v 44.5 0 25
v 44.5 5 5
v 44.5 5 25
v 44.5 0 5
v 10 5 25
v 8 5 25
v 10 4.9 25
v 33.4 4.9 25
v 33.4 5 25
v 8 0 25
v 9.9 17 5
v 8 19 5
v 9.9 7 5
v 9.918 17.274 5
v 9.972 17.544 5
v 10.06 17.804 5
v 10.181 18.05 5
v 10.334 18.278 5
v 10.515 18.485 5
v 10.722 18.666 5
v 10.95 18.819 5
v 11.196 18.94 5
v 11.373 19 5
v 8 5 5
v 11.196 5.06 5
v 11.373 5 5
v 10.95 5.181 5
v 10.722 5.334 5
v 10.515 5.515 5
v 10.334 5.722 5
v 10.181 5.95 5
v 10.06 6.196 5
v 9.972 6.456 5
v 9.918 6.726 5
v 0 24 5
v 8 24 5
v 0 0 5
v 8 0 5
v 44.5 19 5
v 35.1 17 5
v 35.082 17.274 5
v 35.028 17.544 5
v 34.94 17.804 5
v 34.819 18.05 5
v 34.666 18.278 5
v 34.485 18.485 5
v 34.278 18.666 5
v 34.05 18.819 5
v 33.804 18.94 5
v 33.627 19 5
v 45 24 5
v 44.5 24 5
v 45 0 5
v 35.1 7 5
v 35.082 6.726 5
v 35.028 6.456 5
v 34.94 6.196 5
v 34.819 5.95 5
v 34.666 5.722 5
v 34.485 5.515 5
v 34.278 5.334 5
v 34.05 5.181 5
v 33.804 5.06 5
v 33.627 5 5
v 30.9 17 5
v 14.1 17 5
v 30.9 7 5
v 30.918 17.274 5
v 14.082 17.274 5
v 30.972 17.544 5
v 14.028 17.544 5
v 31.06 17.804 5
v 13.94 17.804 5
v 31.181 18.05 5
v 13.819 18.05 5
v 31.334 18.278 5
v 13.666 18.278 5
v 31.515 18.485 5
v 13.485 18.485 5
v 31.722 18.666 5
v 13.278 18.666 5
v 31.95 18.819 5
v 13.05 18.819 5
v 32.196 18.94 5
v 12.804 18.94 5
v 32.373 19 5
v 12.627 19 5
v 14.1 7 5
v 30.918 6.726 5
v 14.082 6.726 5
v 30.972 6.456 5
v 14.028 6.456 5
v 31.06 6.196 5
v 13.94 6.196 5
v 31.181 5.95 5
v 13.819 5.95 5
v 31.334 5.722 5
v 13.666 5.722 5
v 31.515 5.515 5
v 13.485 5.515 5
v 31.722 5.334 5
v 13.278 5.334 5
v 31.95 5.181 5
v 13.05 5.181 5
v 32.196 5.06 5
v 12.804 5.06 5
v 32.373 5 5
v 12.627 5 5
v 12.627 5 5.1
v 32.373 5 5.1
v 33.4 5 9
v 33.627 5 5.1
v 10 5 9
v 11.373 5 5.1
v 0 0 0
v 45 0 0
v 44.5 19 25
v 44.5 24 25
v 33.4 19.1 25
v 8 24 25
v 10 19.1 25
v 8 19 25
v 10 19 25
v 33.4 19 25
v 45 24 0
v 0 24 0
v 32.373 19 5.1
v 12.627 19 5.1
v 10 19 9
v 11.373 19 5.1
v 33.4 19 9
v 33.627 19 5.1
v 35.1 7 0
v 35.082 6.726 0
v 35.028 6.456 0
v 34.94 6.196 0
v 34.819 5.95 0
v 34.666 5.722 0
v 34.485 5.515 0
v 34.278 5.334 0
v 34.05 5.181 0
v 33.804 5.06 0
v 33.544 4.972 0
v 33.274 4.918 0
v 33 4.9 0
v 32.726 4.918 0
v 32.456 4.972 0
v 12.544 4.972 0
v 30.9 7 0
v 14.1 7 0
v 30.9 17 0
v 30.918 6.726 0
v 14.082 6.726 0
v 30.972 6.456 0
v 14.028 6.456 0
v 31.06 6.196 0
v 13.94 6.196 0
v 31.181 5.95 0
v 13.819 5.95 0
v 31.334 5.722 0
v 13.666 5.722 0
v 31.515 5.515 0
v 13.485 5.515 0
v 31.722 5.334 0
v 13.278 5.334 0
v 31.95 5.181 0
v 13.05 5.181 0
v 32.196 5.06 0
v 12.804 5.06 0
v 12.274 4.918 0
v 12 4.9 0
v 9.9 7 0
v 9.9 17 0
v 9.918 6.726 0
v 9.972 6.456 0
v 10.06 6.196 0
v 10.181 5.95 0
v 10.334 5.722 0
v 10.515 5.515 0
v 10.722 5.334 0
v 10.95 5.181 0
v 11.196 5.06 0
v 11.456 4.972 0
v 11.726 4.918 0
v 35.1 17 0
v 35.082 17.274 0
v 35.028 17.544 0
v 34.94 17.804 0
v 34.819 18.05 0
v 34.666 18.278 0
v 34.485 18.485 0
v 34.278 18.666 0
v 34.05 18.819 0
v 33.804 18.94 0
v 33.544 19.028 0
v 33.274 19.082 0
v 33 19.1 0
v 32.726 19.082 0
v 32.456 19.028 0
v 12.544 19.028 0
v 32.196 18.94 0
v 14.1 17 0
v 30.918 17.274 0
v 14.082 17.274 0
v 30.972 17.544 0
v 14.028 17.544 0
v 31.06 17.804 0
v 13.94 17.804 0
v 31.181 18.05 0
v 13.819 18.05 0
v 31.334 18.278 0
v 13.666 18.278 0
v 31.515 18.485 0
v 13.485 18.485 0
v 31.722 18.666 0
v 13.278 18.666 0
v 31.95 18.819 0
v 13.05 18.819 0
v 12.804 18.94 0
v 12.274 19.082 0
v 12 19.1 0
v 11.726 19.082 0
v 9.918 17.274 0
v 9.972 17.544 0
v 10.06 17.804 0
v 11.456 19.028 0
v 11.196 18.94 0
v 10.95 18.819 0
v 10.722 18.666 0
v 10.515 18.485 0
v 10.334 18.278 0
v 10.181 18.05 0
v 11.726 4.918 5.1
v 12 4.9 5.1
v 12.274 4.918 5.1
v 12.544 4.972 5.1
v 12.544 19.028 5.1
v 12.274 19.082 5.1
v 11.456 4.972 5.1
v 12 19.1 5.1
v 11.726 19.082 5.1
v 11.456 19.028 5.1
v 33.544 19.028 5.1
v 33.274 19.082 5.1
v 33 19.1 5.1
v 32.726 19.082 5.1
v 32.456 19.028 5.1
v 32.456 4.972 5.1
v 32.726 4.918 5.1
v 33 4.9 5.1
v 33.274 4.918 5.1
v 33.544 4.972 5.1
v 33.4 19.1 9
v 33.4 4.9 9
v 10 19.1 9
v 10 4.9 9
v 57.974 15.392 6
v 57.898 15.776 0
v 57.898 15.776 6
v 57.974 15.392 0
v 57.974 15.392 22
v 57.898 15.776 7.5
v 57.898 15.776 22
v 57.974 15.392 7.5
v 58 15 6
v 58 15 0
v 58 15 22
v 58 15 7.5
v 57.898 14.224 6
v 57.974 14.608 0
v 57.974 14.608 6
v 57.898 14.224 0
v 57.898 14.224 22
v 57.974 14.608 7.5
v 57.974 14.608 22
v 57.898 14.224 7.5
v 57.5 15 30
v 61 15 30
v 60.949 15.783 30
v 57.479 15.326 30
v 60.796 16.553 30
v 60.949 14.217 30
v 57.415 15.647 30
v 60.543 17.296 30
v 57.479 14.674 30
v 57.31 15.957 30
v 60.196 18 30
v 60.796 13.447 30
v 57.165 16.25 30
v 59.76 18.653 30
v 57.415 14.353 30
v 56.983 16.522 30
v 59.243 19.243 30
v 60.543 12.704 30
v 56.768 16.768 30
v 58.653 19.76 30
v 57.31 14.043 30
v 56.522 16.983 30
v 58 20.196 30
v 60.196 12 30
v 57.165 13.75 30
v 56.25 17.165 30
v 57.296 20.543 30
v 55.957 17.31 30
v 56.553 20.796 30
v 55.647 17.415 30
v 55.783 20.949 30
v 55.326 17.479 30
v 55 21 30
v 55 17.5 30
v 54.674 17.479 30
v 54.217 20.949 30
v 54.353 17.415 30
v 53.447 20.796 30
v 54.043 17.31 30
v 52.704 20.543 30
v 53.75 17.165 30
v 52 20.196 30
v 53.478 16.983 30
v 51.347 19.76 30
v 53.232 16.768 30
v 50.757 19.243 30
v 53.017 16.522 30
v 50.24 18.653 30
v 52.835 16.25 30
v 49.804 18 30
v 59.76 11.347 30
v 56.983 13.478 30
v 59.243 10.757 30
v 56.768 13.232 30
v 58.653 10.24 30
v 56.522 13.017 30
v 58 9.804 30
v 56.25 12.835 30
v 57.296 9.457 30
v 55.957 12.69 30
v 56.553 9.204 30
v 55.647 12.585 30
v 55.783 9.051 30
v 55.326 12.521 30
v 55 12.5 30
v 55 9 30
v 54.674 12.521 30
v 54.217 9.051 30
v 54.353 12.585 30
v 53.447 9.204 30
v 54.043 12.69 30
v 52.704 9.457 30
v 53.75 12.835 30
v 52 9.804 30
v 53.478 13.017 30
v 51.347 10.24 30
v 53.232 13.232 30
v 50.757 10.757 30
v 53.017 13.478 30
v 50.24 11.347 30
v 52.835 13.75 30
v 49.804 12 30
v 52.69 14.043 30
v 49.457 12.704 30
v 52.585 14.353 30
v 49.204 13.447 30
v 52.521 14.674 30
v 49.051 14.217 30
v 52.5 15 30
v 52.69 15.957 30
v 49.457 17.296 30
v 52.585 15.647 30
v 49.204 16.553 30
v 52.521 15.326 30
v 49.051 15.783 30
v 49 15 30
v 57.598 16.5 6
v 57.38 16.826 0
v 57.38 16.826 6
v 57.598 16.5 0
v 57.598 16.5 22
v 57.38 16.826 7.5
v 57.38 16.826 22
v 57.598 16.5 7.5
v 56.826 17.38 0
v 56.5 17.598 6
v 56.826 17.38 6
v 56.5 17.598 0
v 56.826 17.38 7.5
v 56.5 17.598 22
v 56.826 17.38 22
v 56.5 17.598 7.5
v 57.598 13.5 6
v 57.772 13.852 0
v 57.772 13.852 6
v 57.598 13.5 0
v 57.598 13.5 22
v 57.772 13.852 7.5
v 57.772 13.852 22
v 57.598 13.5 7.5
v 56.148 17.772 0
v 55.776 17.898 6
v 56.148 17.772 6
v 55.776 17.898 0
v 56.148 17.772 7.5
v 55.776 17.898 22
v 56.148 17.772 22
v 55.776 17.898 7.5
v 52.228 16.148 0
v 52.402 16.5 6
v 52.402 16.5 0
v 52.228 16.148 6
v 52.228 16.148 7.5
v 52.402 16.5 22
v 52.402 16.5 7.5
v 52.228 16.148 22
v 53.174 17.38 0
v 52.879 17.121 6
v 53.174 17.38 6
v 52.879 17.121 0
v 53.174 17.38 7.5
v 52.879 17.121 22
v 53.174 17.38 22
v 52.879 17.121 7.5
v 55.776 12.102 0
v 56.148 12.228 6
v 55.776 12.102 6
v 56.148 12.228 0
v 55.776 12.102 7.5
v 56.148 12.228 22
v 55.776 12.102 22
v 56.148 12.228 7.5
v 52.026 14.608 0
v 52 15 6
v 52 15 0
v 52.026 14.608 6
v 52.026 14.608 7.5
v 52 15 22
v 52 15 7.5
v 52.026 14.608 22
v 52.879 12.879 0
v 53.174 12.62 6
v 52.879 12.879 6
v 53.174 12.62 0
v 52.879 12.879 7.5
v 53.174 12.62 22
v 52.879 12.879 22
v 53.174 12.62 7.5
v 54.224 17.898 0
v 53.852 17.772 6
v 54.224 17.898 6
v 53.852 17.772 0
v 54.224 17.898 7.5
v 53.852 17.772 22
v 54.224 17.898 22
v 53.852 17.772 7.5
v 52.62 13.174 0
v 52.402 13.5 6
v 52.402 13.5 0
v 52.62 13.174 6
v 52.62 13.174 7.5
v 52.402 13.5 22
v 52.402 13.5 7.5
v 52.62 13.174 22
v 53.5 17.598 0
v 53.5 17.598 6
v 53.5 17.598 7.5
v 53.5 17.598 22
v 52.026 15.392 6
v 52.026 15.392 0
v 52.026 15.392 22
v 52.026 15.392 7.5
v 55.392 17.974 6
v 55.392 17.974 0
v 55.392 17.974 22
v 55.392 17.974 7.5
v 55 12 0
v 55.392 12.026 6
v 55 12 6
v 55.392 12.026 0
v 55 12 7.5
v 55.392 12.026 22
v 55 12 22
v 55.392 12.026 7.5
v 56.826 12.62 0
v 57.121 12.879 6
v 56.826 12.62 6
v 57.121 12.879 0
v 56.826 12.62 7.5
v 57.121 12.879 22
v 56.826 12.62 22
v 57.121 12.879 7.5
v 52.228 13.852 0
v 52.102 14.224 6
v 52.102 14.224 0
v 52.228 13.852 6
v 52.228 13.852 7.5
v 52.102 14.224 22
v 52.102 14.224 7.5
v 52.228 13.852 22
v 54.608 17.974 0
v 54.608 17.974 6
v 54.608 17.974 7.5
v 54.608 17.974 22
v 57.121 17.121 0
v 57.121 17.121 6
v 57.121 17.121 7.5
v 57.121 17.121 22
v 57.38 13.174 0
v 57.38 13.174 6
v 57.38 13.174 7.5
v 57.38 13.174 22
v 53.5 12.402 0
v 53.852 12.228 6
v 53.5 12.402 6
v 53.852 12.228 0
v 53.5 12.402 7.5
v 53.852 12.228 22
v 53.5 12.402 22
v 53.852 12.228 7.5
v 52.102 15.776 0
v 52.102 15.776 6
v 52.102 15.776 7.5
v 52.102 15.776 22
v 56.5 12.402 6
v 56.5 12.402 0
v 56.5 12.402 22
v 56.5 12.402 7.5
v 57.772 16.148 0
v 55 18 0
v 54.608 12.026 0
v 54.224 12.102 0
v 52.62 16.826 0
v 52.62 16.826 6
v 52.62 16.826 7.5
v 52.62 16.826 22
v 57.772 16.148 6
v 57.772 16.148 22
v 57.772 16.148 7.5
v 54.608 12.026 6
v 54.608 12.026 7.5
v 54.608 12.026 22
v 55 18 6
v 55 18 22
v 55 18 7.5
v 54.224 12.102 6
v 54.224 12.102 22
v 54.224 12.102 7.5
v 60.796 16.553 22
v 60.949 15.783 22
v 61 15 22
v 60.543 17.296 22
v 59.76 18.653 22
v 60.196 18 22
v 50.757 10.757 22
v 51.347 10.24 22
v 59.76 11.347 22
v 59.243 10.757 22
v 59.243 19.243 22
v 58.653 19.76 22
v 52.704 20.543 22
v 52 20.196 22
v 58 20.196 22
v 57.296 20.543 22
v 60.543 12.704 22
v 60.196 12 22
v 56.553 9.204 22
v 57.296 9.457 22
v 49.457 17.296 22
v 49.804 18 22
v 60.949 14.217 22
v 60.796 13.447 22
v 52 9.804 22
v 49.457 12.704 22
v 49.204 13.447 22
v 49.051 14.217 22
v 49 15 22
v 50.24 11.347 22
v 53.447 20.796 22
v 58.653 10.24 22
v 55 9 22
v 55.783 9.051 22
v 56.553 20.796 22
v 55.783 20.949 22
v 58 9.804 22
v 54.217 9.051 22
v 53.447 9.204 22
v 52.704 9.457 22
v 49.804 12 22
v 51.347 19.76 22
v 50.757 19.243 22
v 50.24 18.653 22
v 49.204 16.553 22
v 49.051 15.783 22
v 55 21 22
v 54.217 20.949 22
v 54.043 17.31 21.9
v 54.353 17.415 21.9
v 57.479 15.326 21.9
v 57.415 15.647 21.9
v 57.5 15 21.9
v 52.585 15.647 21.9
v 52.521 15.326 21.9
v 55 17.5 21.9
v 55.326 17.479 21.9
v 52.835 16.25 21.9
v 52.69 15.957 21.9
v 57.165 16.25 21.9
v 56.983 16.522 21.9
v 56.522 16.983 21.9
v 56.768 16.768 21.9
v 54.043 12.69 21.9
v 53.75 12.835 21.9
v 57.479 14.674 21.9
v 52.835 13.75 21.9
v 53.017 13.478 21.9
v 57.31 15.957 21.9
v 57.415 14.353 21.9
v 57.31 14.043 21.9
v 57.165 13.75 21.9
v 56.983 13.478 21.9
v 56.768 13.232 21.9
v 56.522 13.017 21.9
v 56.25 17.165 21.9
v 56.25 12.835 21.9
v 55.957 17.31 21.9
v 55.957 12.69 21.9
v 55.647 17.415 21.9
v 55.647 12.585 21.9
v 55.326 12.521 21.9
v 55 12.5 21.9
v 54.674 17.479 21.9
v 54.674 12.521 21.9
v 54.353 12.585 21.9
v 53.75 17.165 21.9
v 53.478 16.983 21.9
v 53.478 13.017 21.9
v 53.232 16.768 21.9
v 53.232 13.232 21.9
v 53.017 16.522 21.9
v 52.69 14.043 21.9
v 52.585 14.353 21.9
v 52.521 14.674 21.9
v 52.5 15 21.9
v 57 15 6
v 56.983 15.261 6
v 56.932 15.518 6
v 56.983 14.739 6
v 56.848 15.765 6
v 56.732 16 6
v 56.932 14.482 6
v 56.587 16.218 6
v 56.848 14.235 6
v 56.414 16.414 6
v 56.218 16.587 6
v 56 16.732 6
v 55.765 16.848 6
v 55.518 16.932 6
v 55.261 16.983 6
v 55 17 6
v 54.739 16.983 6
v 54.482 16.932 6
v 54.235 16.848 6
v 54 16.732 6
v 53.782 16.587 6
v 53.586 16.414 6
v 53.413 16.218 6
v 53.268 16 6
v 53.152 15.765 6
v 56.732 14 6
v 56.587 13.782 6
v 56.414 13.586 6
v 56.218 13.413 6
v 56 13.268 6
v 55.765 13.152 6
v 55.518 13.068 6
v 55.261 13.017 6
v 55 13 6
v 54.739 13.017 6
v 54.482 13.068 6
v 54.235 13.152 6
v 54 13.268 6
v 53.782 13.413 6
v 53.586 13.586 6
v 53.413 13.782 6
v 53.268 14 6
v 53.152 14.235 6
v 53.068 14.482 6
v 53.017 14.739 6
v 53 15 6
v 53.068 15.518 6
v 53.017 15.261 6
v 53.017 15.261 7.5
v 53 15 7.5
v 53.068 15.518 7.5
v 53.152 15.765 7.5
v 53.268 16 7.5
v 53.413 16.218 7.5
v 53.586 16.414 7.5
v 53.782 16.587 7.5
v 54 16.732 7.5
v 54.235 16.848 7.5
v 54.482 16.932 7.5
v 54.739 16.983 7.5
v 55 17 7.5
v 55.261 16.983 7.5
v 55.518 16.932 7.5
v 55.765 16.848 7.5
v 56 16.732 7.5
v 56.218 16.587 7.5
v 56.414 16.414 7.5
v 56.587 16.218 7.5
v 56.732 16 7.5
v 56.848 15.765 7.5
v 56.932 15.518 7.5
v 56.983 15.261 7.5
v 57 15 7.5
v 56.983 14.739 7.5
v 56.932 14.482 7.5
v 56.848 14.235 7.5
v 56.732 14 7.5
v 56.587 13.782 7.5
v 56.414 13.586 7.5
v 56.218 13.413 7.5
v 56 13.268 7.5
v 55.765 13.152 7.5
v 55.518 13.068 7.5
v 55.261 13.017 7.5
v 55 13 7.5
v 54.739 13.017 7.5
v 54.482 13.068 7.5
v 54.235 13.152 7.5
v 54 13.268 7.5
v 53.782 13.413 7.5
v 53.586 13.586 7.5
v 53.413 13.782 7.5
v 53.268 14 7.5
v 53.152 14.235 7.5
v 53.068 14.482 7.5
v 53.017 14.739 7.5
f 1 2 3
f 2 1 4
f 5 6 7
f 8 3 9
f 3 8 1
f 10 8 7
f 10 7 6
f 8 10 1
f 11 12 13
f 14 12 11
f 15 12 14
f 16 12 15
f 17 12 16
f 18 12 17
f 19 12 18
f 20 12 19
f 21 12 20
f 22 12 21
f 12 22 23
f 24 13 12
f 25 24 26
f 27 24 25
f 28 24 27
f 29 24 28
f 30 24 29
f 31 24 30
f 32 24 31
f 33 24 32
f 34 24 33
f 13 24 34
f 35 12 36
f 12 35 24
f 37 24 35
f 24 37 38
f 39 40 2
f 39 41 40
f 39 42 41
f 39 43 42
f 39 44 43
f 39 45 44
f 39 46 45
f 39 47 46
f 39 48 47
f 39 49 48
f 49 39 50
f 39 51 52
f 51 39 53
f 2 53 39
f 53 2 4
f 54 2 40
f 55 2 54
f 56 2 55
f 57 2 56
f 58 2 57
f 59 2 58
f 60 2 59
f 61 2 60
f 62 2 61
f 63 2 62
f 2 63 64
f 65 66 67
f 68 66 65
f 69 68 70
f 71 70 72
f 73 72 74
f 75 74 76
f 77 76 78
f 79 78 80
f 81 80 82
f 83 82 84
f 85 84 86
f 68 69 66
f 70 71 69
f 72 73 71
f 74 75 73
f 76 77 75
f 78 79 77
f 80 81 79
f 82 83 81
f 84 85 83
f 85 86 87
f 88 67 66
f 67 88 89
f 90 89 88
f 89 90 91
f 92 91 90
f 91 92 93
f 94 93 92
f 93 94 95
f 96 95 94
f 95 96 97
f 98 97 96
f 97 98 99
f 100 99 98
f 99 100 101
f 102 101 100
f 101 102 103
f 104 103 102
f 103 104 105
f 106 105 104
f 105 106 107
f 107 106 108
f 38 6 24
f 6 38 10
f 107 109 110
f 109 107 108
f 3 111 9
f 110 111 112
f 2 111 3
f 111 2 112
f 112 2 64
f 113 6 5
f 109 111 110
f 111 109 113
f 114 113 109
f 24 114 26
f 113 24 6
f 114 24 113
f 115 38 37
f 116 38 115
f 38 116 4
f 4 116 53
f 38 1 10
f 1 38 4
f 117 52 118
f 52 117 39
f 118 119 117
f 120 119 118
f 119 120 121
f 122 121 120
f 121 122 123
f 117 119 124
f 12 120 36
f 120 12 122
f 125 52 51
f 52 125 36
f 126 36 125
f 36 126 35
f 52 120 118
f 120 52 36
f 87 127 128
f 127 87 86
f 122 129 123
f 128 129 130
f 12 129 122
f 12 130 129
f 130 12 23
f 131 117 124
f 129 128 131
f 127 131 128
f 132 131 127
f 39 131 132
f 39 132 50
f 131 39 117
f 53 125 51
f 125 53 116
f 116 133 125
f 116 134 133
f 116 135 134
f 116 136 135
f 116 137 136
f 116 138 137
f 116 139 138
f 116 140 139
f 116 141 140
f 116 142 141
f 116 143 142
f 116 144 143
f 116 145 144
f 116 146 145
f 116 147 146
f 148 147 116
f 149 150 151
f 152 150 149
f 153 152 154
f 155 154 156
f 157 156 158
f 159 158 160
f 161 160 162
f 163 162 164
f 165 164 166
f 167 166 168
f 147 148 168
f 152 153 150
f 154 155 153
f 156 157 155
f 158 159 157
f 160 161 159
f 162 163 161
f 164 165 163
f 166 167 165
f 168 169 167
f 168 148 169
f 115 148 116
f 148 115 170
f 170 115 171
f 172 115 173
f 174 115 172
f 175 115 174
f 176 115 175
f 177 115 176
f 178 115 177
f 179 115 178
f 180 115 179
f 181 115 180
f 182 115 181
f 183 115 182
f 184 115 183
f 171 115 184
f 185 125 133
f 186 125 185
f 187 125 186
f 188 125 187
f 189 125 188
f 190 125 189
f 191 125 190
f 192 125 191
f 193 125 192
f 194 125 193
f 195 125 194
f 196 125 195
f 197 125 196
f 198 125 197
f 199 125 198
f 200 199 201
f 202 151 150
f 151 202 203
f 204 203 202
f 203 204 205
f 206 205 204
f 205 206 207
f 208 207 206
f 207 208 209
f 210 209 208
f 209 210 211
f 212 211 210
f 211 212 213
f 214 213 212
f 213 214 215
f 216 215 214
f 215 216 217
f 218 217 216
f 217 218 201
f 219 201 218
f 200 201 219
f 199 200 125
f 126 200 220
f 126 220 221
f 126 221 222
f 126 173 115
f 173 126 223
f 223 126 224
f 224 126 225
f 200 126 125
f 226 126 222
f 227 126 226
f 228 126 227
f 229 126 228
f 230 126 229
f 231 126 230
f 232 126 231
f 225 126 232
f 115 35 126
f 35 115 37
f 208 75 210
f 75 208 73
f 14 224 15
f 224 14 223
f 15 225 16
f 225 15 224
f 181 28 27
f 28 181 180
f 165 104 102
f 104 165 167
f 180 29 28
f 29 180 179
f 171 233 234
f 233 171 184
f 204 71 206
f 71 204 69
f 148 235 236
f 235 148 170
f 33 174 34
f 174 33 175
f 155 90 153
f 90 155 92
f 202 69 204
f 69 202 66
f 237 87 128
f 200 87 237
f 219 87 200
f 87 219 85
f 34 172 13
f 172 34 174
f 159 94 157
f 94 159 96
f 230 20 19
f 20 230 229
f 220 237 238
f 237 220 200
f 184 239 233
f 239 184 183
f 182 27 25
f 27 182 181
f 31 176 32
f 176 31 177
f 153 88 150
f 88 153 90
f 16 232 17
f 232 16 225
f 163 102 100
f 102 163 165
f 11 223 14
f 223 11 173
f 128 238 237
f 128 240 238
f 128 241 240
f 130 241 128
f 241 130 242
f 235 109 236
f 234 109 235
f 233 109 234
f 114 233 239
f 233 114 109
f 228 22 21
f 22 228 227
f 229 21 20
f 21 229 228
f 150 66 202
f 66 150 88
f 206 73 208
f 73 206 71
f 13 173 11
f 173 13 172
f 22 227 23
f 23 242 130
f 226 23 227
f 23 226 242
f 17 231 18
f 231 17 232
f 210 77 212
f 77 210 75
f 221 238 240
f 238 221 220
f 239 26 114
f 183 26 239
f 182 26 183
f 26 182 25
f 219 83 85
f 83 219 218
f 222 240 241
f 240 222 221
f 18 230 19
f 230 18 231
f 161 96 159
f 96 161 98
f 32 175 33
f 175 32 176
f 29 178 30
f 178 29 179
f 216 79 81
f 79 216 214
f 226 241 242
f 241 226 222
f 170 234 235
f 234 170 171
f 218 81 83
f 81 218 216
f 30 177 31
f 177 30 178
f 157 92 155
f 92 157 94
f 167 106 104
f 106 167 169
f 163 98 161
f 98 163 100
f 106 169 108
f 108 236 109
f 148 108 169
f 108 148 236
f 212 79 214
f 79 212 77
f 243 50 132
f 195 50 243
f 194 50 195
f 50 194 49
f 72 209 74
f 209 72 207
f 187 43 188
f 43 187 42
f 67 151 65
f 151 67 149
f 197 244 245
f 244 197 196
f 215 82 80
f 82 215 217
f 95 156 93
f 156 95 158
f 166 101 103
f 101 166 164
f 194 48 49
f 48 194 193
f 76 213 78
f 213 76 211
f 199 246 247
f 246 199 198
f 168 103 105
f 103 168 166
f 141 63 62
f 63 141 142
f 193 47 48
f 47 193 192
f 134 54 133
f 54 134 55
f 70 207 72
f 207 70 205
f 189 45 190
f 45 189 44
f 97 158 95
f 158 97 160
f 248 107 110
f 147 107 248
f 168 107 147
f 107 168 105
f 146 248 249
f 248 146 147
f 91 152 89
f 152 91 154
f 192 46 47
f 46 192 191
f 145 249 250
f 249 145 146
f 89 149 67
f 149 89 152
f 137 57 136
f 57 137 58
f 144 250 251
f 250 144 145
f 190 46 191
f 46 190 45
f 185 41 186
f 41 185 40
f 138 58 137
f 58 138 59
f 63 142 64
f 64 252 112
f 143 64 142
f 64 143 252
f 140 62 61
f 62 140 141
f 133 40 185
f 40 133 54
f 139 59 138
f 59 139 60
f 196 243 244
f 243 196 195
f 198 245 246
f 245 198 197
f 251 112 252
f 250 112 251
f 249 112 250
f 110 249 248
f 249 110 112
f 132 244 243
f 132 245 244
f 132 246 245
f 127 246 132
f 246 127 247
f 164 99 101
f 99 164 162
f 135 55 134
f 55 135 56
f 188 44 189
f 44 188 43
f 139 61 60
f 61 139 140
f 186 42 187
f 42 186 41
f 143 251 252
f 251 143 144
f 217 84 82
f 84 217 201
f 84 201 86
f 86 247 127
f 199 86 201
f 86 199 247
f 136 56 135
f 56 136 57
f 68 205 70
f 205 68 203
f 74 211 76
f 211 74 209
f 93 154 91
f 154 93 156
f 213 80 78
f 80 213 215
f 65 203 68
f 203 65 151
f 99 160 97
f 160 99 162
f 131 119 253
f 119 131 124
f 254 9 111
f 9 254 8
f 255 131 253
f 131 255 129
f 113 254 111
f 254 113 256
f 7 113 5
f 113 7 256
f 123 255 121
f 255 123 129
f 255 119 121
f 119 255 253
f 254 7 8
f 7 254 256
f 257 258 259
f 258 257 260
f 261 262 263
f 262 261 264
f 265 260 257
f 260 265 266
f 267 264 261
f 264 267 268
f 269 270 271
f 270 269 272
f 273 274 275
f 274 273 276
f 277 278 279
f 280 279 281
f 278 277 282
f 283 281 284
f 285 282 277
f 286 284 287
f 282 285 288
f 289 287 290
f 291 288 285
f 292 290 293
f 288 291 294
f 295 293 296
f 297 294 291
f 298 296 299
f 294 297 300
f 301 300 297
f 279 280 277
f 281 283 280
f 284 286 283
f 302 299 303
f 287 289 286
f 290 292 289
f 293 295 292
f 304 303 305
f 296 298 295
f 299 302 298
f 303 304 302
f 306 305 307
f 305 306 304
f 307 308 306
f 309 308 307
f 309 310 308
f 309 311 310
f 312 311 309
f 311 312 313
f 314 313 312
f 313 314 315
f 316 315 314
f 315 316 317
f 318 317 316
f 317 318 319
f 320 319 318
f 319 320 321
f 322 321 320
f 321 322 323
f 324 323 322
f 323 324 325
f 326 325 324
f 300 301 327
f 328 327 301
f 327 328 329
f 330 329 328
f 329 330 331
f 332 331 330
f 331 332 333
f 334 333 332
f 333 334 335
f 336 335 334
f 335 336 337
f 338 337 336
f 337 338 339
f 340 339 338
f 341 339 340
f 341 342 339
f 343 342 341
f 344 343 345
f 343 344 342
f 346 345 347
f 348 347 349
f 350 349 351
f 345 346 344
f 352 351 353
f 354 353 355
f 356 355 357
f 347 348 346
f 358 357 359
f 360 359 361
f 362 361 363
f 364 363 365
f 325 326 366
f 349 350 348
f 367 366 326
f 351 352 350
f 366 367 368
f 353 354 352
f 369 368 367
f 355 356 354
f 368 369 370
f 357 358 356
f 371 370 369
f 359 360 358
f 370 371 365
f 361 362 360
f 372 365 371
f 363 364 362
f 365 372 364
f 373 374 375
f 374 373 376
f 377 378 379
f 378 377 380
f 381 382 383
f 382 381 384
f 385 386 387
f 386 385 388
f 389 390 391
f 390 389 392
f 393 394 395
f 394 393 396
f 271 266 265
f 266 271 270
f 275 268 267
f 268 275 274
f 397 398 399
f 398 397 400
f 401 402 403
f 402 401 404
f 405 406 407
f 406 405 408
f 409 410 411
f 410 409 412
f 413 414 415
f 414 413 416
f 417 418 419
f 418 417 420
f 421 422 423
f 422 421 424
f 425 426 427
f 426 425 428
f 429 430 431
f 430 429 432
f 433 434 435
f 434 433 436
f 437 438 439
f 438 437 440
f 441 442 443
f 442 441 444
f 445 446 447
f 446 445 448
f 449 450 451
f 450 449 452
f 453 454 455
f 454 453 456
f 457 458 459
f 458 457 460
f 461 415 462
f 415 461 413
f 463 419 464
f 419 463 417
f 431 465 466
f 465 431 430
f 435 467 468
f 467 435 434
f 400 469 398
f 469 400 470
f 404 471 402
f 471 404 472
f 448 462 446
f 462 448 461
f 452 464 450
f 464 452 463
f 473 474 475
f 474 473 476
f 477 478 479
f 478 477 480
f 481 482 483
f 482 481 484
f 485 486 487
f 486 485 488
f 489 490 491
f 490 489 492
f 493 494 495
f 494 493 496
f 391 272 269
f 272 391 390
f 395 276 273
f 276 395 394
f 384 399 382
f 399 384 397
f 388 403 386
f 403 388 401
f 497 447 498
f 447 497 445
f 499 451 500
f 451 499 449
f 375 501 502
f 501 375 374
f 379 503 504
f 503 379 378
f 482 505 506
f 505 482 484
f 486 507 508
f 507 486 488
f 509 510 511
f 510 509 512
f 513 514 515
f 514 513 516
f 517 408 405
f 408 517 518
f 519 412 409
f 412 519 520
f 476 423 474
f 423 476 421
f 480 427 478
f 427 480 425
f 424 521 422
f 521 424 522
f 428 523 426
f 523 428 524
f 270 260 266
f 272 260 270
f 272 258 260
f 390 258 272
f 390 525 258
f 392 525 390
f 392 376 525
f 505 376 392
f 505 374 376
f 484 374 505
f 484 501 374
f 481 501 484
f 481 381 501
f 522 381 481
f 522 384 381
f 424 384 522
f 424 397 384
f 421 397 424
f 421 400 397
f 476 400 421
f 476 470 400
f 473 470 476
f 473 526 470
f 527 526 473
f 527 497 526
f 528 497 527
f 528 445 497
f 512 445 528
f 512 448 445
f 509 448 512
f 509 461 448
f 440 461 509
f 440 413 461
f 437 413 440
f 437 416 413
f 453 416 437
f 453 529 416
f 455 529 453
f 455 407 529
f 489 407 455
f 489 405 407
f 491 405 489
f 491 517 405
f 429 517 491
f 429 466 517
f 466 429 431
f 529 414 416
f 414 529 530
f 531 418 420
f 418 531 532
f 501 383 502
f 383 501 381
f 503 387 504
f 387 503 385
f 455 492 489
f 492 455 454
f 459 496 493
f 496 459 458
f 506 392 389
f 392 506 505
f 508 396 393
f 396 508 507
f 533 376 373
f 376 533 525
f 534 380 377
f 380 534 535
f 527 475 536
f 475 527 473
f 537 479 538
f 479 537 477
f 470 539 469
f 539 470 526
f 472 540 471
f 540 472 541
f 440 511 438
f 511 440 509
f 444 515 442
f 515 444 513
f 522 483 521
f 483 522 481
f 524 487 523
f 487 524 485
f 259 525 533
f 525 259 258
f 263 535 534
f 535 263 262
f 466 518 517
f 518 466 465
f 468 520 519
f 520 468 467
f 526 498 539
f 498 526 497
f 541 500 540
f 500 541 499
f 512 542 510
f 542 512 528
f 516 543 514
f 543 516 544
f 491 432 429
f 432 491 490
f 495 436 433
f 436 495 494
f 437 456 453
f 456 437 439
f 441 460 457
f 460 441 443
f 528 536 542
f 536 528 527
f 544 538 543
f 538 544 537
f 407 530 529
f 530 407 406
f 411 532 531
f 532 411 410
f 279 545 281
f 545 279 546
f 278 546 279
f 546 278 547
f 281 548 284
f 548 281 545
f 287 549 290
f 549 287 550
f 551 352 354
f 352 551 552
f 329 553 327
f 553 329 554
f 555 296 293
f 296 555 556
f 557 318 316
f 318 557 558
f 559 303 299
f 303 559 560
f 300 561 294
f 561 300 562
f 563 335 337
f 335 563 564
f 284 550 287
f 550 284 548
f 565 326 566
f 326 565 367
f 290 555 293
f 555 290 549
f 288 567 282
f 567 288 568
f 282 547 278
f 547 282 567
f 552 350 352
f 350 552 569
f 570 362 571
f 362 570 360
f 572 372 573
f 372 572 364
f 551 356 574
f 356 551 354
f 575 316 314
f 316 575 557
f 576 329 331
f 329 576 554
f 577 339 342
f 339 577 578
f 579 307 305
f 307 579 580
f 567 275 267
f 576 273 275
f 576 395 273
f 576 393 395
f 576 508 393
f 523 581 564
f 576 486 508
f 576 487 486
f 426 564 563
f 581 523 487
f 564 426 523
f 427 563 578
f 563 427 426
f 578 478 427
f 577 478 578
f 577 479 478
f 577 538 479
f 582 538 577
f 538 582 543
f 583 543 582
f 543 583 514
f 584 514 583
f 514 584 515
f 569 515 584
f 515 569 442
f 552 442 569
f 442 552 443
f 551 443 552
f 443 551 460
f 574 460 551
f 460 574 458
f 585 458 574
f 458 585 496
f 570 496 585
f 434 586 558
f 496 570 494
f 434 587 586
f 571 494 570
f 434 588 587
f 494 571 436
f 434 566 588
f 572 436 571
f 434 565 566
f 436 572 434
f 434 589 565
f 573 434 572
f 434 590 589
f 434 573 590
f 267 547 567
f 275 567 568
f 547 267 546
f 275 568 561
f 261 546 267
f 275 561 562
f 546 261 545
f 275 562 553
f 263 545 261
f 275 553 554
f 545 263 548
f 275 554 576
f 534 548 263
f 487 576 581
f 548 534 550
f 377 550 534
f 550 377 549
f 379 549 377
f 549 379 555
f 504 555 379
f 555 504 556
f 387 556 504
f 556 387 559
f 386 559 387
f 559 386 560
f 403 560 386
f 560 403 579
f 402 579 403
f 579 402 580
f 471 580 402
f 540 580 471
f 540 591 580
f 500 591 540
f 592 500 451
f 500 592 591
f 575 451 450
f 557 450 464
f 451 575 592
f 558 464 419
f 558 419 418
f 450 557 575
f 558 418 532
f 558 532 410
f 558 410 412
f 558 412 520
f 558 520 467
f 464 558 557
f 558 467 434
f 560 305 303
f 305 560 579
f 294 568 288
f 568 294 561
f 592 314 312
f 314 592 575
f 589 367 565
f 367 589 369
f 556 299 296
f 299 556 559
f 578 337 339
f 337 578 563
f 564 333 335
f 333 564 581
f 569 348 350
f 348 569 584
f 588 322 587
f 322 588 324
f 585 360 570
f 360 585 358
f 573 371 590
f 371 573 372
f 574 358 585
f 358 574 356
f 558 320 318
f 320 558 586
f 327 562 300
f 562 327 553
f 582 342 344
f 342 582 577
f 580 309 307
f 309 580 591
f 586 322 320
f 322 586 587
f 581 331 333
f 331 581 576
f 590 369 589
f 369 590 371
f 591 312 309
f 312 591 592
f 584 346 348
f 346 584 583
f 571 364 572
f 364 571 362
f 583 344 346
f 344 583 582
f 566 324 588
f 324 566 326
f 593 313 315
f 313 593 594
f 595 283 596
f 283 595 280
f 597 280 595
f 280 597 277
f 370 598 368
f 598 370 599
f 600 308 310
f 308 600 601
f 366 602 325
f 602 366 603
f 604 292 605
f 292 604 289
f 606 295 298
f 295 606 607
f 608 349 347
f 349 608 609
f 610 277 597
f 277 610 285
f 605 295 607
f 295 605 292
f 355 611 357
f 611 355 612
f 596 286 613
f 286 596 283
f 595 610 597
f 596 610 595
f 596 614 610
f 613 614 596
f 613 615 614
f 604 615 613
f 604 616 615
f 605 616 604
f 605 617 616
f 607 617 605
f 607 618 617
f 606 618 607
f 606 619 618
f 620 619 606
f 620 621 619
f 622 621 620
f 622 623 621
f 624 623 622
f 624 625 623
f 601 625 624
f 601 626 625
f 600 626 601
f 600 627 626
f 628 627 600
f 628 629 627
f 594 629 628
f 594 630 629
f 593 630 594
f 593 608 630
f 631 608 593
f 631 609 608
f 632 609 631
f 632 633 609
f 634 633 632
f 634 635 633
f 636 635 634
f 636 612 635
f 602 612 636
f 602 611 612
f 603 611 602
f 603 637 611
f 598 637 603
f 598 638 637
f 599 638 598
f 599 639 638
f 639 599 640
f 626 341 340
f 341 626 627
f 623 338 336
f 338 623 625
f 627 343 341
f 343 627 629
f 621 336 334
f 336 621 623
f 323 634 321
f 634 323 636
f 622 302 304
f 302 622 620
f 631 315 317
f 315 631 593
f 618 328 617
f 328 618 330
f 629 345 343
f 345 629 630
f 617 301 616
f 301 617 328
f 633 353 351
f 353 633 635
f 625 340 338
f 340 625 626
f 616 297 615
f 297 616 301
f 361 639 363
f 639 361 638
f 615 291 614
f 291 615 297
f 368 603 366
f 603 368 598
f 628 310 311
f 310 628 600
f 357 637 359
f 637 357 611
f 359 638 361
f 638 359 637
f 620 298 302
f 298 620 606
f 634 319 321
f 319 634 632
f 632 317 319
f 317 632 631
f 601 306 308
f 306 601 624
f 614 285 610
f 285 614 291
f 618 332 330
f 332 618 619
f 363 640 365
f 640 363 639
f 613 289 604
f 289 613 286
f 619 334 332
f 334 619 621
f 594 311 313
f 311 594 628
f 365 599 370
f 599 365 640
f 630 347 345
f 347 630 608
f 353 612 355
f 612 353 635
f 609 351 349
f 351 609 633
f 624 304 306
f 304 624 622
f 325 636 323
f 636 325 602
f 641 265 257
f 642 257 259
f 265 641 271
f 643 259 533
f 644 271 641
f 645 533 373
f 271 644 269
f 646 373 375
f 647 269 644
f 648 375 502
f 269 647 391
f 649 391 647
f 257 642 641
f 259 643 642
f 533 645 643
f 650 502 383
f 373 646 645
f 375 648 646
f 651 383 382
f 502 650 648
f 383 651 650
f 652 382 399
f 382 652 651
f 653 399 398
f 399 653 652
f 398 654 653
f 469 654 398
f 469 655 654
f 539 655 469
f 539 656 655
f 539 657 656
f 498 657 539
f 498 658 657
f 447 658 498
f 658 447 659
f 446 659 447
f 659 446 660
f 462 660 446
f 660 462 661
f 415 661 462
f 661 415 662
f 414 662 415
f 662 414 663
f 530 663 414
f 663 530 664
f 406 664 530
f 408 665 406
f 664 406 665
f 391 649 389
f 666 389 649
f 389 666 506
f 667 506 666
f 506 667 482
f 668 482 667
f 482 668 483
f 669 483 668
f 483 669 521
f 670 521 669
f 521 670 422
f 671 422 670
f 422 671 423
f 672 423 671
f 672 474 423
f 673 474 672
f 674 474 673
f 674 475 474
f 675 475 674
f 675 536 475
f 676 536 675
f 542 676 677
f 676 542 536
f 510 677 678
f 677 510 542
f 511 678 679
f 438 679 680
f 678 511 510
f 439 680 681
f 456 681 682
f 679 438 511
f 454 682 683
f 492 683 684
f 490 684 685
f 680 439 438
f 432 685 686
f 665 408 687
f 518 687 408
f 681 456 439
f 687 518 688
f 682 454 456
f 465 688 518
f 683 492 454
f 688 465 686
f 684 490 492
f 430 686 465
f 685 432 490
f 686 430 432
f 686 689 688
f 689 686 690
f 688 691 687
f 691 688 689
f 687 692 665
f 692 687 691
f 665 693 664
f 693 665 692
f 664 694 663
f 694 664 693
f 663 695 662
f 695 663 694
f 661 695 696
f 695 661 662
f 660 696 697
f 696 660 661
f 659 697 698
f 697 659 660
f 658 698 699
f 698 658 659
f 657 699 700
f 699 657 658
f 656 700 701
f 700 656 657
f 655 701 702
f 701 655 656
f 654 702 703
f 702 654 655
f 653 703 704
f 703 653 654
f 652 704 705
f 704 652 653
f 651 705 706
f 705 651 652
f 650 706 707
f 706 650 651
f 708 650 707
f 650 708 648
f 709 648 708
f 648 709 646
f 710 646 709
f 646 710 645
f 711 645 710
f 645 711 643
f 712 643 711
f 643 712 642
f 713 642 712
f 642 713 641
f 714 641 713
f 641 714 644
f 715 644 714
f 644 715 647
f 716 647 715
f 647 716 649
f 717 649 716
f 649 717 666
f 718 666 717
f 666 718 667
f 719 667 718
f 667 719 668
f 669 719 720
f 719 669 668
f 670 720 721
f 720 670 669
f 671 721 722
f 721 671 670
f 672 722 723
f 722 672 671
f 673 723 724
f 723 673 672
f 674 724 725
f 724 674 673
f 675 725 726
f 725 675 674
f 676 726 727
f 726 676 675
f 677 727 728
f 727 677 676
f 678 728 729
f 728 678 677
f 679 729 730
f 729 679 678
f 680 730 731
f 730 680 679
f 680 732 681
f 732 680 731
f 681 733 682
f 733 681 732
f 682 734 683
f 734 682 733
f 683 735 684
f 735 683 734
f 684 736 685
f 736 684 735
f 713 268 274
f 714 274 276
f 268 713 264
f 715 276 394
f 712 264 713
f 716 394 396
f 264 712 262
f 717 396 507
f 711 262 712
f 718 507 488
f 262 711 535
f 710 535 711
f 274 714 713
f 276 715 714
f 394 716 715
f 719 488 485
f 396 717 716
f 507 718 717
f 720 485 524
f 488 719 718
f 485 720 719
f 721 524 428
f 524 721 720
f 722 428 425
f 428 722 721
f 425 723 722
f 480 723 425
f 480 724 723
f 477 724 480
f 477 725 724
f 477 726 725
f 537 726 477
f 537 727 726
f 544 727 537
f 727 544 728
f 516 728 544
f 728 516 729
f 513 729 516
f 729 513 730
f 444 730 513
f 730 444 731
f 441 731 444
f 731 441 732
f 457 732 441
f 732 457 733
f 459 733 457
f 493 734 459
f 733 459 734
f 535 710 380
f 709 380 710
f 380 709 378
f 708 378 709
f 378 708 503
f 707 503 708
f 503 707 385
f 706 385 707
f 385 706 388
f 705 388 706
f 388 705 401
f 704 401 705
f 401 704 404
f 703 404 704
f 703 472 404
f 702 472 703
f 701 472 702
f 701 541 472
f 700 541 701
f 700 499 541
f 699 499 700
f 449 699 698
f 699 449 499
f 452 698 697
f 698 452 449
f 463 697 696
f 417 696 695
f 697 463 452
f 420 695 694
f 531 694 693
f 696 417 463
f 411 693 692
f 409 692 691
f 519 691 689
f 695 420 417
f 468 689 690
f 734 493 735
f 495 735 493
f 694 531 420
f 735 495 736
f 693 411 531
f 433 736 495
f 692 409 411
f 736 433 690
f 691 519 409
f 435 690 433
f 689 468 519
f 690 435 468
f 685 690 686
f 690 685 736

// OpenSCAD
// file: 00_config.scad
// 00_config.scad — shared dimensions for the AndroidTester machine, in mm.
//
// These constants are the single source for every part in cad/openscad/.
// They are cross-checked by tests/test_design_package.py against
// androidtester/config.py (deck size, clearance planes) and
// firmware/klipper/androidtester.cfg (position_max) — change them together.

// -- deck and travels -------------------------------------------------------
// Deck == reachable XY (cfg position_max == config.py deck defaults).
DECK_W   = 400;          // deck X, config.py deck_width_mm, stepper_x position_max
DECK_D   = 300;          // deck Y, config.py deck_height_mm, stepper_y position_max
X_TRAVEL = 400;          // == DECK_W
Y_TRAVEL = 300;          // == DECK_D
Z_TRAVEL = 60;           // tool-Z elevator travel (manual_stepper tool_z)
TRAVEL_Z = 40;           // clearance plane, config.py travel_z_mm
TOUCH_Z  = 5;            // finger-tip contact plane, config.py touch_z_mm

// -- linear rails -------------------------------------------------------------
// X rail: must span the full X travel plus the carriage plus end margins:
//   X_TRAVEL (400) + X_CARRIAGE_LEN (45) + 2*END_MARGIN (10) = 465 mm min
//   -> RAIL_X_LEN = 500 (next stock MGN12 length, 35 mm of setup slack).
// Y rails (x2, carry the gantry beam):
//   Y_TRAVEL (300) + X_CARRIAGE_LEN (45) + 2*END_MARGIN (10) = 365 mm min
//   -> RAIL_Y_LEN = 400.
// Z rail (tool elevator, MGN9):
//   Z_TRAVEL (60) + Z_CARRIAGE_LEN (40) + 2*END_MARGIN (10) = 120 mm min
//   -> RAIL_Z_LEN = 150.
RAIL_X_LEN = 500;
RAIL_Y_LEN = 400;
RAIL_Z_LEN = 150;
X_CARRIAGE_LEN = 45;     // MGN12H block, 27 x 45.4 mm (nominal — verify rail vendor)
Z_CARRIAGE_LEN = 40;     // MGN9H block, 20 x 38.9 mm (nominal — verify rail vendor)
END_MARGIN   = 10;       // endstop trigger + belt/idler clearance at each rail end
RAIL12_W = 12;           // MGN12 rail width / height
RAIL12_H = 8;
RAIL9_W  = 9;            // MGN9 rail width / height
RAIL9_H  = 6.5;

// -- frame --------------------------------------------------------------------
EXT = 20;                // 2020 aluminium extrusion (6 mm slot)
FRAME_W = DECK_W + 100;  // 500 — gantry beam carries the full X rail (500)
FRAME_D = DECK_D + 100;  // 400 — side beams carry the full Y rails (400)
POST_H  = 200;           // gantry posts above the base frame
CAM_POST_H = 400;        // overhead camera post above the deck

// -- motors / motion hardware ---------------------------------------------------
NEMA_W   = 42.3;         // NEMA17 face
NEMA_HOLE_SP = 31;       // NEMA17 M3 hole spacing
NEMA_BORE  = 22.2;       // NEMA17 pilot bore (clearance)
PULLEY_D = 12.2;         // GT2 20T pulley OD (2 mm pitch x 20 T = 40 mm/rev)
IDLER_D  = 12.2;         // GT2 20T idler OD, 5 mm bore
BELT_W   = 6;            // GT2 belt width
LEAD_D   = 8;            // T8 lead screw (2 mm pitch x 4 starts = 8 mm/rev)

// -- servos (SG90 / MG90S class) -------------------------------------------------
SERVO_W   = 23;          // body across tabs axis
SERVO_D   = 12.5;        // body depth
SERVO_H   = 23;          // body height below the mounting tabs
SERVO_TAB_W = 32.5;      // across the mounting tabs
SERVO_SHAFT_D = 5;       // output shaft / horn boss clearance
SERVO_SHAFT_OFF = 6;     // shaft centre from body end wall

// -- finger tool -----------------------------------------------------------------
FINGER_TIP_D  = 8;       // conductive tip diameter
FINGER_SHAFT_D = 6;      // plunger shaft
SPRING_D  = 8.5;         // compression-spring pocket (Ø8 spring, k ≈ 0.5 N/mm)
FINGER_STROKE = 15;      // spring working stroke (3–12 mm compression -> 1.5–6 N)

// -- fasteners ---------------------------------------------------------------------
M3_CLEAR = 3.2;
M4_CLEAR = 4.2;
M5_CLEAR = 5.3;
M3_HEAD  = 6.0;          // M3 button-head clearance

// -- device nest ---------------------------------------------------------------------
DEVICE_MAX_W = 280;      // phones through ~11" tablets (250 x 170 + case)
DEVICE_MAX_D = 200;
NEST_STOP_H  = 8;        // stop height: below screen, clear of ArUco markers
NEST_CLEAR   = 40;       // keep-out at each deck corner (ArUco marker zone)

$fn = 48;
// main file
// button_plunger.scad — nest-mounted servo plunger for recessed side buttons
// (power / volume). The servo body bolts to a slotted base on the deck plate;
// its horn carries a Ø6 push pin riding in a guide bore, aligned with the
// device edge. Two of these live on the nest (plunger_0 / plunger_1).
//
// Parts (PART selector):
//   plunger_base — servo cradle + deck slots (M4, 15 mm edge-distance travel)
//   plunger_pin  — push pin with horn hub and return-spring groove
//
// Export: openscad -o plunger_base.stl -D 'PART="plunger_base"' button_plunger.scad
include <00_config.scad>

PART = is_undef(_AT_PART) ? "preview" : _AT_PART;  // -D 'PART=...' or a render wrapper overrides

module plunger_base() {
    base_w = 45;
    base_d = 24;
    t = 5;
    cradle_h = 20;
    gap = base_d - 2 * t;   // 14 mm = SERVO_D (12.5) + running clearance
    difference() {
        union() {
            cube([base_w, base_d, t]);
            // cradle walls: servo body drops between them, tabs rest on top
            for (sy = [0, base_d - t])
                translate([8, sy, t]) cube([SERVO_TAB_W + 4, t, cradle_h]);
        }
        // servo well between the walls, open at the top (tabs sit on the walls)
        translate([8 + 2, t - 0.1, t + 4])
            cube([SERVO_W + 0.4, gap + 0.2, cradle_h]);
        // pin guide bore Ø6.2 through both walls at horn height
        translate([8 - 0.1, base_d / 2, t + 12])
            rotate([0, 90, 0]) cylinder(d = 6.2, h = SERVO_TAB_W + 4.2);
        // M4 deck slots, 10 mm of edge-distance adjustment
        for (x = [12, base_w - 12])
            hull()
                for (dy = [-5, 5])
                    translate([x, base_d / 2 + dy, -0.1])
                        cylinder(d = M4_CLEAR, h = t + 0.2);
    }
}

module plunger_pin() {
    pin_l = 30;
    difference() {
        union() {
            cylinder(d = 6, h = pin_l);                       // push pin
            translate([0, 0, pin_l - 8]) cylinder(d = 12, h = 8); // horn hub
        }
        // horn boss bore + M3 screw
        translate([0, 0, pin_l - 8.1]) cylinder(d = SERVO_SHAFT_D, h = 8.2);
        // return-spring groove (Ø1 wire, 2 mm deep, 6 mm from the tip)
        translate([0, 0, 6]) rotate_extrude()
            translate([2, 0, 0]) square([2, 1.5]);
    }
}

// -- preview / selector ---------------------------------------------------------
if (PART == "preview" || PART == "plunger_base")
    plunger_base();
if (PART == "preview")
    translate([55, 15, 0]) plunger_pin();
else if (PART == "plunger_pin")
    plunger_pin();
